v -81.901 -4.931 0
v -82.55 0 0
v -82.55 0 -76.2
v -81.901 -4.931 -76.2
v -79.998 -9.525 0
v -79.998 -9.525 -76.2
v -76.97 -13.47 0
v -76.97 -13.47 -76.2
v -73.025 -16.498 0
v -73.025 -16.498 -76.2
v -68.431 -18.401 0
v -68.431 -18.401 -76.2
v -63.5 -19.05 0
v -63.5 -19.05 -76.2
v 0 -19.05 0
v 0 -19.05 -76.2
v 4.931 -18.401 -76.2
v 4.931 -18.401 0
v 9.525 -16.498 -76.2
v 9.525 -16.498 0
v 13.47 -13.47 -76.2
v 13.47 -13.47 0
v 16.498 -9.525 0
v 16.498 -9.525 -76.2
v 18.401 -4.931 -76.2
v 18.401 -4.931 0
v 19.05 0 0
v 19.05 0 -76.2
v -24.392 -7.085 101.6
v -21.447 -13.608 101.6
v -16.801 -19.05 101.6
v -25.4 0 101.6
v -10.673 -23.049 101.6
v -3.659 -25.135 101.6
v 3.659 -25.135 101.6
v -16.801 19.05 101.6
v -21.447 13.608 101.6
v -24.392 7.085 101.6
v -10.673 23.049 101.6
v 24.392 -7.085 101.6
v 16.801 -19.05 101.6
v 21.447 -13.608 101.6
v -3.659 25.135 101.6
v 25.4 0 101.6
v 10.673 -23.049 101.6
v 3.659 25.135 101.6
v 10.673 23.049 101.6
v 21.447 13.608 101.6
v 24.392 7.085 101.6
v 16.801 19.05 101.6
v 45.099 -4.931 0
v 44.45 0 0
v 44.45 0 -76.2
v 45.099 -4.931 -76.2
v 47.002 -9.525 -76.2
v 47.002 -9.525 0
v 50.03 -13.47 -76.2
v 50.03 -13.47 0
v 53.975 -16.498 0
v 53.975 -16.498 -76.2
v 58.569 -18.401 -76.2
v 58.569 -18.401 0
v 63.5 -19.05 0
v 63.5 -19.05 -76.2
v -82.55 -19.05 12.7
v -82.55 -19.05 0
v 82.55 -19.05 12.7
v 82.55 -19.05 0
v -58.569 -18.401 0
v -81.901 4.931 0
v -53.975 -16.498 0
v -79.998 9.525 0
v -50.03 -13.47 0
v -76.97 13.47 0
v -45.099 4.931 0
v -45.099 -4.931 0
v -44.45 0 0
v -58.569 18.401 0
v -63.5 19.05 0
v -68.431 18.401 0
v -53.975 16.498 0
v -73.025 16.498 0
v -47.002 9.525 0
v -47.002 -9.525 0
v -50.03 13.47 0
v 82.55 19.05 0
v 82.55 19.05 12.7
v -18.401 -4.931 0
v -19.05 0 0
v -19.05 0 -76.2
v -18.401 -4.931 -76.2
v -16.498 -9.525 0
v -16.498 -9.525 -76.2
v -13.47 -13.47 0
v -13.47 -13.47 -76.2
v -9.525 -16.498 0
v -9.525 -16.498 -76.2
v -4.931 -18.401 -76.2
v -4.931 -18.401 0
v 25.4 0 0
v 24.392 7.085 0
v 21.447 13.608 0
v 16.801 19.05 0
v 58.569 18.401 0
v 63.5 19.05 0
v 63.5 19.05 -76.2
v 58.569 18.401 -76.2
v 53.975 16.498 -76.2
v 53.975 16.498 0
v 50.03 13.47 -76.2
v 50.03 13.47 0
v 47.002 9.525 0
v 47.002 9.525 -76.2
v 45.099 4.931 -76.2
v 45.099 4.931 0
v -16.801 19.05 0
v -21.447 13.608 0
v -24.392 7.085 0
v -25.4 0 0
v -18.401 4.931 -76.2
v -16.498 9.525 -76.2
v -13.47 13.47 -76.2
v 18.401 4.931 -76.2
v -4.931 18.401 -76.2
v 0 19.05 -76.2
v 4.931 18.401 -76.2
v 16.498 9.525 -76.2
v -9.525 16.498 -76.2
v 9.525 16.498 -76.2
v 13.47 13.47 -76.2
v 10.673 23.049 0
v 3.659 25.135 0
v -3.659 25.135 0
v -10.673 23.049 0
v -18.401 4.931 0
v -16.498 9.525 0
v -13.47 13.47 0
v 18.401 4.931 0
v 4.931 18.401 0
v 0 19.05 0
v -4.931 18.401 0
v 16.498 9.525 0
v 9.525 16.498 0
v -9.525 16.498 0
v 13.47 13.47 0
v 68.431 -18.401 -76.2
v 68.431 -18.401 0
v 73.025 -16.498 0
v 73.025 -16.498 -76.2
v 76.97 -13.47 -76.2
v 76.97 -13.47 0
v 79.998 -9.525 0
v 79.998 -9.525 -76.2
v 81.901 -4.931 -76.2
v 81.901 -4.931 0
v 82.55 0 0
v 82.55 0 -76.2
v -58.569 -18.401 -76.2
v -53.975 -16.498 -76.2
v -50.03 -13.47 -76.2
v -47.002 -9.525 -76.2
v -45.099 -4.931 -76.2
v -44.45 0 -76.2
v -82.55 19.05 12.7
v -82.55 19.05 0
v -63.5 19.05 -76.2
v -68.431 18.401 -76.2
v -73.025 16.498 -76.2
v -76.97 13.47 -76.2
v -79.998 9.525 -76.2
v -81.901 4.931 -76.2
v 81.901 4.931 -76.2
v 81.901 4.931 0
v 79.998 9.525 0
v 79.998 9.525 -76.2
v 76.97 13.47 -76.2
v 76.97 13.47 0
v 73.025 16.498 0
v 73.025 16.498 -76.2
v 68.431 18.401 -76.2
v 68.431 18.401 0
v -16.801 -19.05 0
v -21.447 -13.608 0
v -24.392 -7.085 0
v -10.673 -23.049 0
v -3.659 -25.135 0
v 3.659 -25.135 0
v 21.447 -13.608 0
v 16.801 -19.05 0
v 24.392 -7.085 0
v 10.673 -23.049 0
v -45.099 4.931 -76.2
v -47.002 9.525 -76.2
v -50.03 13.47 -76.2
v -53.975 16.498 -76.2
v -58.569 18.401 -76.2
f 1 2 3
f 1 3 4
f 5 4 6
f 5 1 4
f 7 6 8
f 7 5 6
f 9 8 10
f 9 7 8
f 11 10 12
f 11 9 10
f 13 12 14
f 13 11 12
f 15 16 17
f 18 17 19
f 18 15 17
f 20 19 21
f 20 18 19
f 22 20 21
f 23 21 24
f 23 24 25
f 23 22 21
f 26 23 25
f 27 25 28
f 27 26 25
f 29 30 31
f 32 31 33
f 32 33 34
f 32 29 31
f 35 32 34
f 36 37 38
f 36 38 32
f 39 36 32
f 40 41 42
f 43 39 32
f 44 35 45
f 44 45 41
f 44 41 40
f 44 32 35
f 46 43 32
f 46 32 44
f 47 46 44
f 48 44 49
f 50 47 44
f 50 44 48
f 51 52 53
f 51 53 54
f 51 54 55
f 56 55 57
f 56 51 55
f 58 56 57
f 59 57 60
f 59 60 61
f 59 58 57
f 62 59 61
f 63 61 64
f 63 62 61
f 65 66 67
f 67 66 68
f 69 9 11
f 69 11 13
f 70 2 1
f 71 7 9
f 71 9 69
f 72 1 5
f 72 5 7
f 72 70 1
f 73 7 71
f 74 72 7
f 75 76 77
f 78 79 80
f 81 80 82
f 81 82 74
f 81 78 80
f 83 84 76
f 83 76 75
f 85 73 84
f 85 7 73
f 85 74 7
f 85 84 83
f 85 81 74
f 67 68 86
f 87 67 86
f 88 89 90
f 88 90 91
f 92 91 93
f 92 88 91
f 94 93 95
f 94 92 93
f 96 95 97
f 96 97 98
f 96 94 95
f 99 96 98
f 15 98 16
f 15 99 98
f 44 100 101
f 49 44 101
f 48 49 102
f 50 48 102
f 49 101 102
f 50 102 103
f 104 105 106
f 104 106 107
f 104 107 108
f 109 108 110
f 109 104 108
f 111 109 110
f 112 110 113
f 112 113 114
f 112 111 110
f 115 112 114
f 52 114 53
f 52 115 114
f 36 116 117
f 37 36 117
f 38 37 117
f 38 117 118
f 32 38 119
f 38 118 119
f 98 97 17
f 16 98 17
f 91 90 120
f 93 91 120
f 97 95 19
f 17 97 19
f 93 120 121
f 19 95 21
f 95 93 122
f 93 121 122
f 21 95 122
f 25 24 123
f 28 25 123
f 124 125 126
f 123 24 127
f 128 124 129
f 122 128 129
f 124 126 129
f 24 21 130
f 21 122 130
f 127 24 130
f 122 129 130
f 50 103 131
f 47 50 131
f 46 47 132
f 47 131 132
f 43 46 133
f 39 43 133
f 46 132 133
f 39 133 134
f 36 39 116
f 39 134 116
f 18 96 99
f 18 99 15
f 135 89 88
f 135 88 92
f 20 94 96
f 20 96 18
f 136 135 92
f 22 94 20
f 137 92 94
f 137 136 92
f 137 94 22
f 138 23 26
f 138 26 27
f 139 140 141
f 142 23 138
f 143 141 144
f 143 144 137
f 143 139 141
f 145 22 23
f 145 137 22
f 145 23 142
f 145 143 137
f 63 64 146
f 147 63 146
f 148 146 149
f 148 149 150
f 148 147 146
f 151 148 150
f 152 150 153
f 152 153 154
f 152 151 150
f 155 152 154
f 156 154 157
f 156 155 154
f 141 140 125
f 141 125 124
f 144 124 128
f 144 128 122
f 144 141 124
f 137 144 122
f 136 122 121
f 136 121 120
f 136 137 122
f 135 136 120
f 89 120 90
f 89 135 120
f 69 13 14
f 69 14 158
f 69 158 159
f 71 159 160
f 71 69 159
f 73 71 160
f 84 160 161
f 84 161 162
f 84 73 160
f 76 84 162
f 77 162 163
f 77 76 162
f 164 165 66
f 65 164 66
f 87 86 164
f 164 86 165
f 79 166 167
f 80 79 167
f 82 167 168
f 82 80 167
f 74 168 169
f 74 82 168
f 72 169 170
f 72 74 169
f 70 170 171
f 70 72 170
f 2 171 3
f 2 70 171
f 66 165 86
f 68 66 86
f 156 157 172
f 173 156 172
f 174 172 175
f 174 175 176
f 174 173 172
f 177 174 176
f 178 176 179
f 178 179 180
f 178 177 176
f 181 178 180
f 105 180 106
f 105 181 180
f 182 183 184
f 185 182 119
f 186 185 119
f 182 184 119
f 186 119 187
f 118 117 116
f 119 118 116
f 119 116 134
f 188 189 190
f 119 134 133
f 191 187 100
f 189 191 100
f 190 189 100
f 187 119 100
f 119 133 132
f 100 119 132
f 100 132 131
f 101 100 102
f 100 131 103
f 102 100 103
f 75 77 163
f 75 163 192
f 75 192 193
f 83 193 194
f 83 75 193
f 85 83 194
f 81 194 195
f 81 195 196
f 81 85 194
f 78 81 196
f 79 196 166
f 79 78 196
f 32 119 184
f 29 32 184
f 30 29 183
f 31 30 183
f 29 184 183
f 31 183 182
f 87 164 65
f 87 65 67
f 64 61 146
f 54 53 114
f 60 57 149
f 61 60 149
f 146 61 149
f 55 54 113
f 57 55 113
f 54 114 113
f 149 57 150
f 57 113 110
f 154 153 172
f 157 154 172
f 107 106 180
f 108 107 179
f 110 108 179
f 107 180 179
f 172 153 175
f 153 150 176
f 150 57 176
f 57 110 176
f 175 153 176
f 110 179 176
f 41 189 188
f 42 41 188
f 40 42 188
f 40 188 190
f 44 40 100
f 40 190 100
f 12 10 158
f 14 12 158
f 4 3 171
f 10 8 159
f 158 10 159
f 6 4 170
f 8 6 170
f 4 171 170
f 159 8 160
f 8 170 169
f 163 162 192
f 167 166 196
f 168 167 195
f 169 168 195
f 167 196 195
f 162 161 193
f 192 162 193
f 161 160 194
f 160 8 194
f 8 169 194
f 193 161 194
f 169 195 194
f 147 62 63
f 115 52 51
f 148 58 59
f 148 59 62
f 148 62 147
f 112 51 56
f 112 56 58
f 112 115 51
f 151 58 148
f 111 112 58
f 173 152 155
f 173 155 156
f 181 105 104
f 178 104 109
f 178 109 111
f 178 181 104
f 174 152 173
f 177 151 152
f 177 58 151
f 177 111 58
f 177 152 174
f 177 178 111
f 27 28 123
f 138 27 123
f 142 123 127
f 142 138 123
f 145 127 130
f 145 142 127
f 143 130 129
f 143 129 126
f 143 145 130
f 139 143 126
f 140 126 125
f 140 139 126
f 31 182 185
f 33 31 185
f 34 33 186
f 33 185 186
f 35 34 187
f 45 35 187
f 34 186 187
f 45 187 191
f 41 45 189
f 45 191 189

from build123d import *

# Parameters (mm, degrees)
F1_DEPTH = 12.7
F2_DEPTH = 76.2
F3_DEPTH = 101.6


with BuildPart() as f1:
    # F0 (on Top) → F1 (new body)
    with BuildSketch(Plane.XY):
        with BuildLine():
            ThreePointArc((-82.55, 1.56e-07), (-76.9703841264, 13.4703842368), (-63.5, 19.05))
            Line((-63.5, 19.05), (-82.55, 19.05))
            Line((-82.55, 19.05), (-82.55, 1.56e-07))
        make_face()
        with BuildLine():
            ThreePointArc((-63.5, -19.05), (-76.9703842368, -13.4703841264), (-82.55, 1.56e-07))
            Line((-82.55, 1.56e-07), (-82.55, -19.05))
            Line((-82.55, -19.05), (-63.5, -19.05))
        make_face()
        with BuildLine():
            Line((82.55, 0), (82.55, 19.05))
            Line((82.55, 19.05), (63.5, 19.05))
            ThreePointArc((63.5, 19.05), (76.9703841816, 13.4703841816), (82.55, 0))
        make_face()
        with BuildLine():
            Line((82.55, -19.05), (82.55, 0))
            ThreePointArc((82.55, 0), (76.9703841816, -13.4703841816), (63.5, -19.05))
            Line((63.5, -19.05), (82.55, -19.05))
        make_face()
        with BuildLine():
            ThreePointArc((25.4, 0), (23.1505208253, 10.4505208253), (16.8005208253, 19.05))
            Line((16.8005208253, 19.05), (1.179e-07, 19.05))
            ThreePointArc((1.179e-07, 19.05), (13.4703842233, 13.4703841399), (19.05, 0))
            Line((19.05, 0), (25.4, 0))
        make_face()
        with BuildLine():
            ThreePointArc((19.05, 0), (13.4703842233, 13.4703841399), (1.179e-07, 19.05))
            ThreePointArc((1.179e-07, 19.05), (-13.4703841399, 13.4703842233), (-19.05, 0))
            ThreePointArc((-19.05, 0), (-13.4703841805, -13.4703841827), (3.1e-09, -19.05))
            ThreePointArc((3.1e-09, -19.05), (13.4703841827, -13.4703841805), (19.05, 0))
        make_face()
        with BuildLine():
            ThreePointArc((-25.4, 0), (-23.1505208253, 10.4505208253), (-16.8005208253, 19.05))
            Line((-16.8005208253, 19.05), (-63.5, 19.05))
            ThreePointArc((-63.5, 19.05), (-50.0296158184, 13.4703841816), (-44.45, 0))
            Line((-44.45, 0), (-25.4, 0))
        make_face()
        with BuildLine():
            ThreePointArc((-44.45, 0), (-50.0296158184, 13.4703841816), (-63.5, 19.05))
            ThreePointArc((-63.5, 19.05), (-76.9703841264, 13.4703842368), (-82.55, 1.56e-07))
            ThreePointArc((-82.55, 1.56e-07), (-76.9703842368, -13.4703841264), (-63.5, -19.05))
            ThreePointArc((-63.5, -19.05), (-50.0296158184, -13.4703841816), (-44.45, 0))
        make_face()
        with BuildLine():
            ThreePointArc((-16.8005208253, -19.05), (-23.1505208253, -10.4505208253), (-25.4, 0))
            Line((-25.4, 0), (-44.45, 0))
            ThreePointArc((-44.45, 0), (-50.0296158184, -13.4703841816), (-63.5, -19.05))
            Line((-63.5, -19.05), (-16.8005208253, -19.05))
        make_face()
        with BuildLine():
            ThreePointArc((-19.05, 0), (-13.4703841399, 13.4703842233), (1.179e-07, 19.05))
            Line((1.179e-07, 19.05), (-16.8005208253, 19.05))
            ThreePointArc((-16.8005208253, 19.05), (-23.1505208253, 10.4505208253), (-25.4, 0))
            Line((-25.4, 0), (-19.05, 0))
        make_face()
        with BuildLine():
            ThreePointArc((3.1e-09, -19.05), (-13.4703841805, -13.4703841827), (-19.05, 0))
            Line((-19.05, 0), (-25.4, 0))
            ThreePointArc((-25.4, 0), (-23.1505208253, -10.4505208253), (-16.8005208253, -19.05))
            Line((-16.8005208253, -19.05), (3.1e-09, -19.05))
        make_face()
        with BuildLine():
            ThreePointArc((16.8005208253, -19.05), (23.1505208253, -10.4505208253), (25.4, 0))
            Line((25.4, 0), (19.05, 0))
            ThreePointArc((19.05, 0), (13.4703841827, -13.4703841805), (3.1e-09, -19.05))
            Line((3.1e-09, -19.05), (16.8005208253, -19.05))
        make_face()
        with BuildLine():
            ThreePointArc((63.5, -19.05), (50.0296158184, -13.4703841816), (44.45, 0))
            Line((44.45, 0), (25.4, 0))
            ThreePointArc((25.4, 0), (23.1505208253, -10.4505208253), (16.8005208253, -19.05))
            Line((16.8005208253, -19.05), (63.5, -19.05))
        make_face()
        with BuildLine():
            ThreePointArc((44.45, 0), (50.0296158184, 13.4703841816), (63.5, 19.05))
            Line((63.5, 19.05), (16.8005208253, 19.05))
            ThreePointArc((16.8005208253, 19.05), (23.1505208253, 10.4505208253), (25.4, 0))
            Line((25.4, 0), (44.45, 0))
        make_face()
        with BuildLine():
            ThreePointArc((82.55, 0), (76.9703841816, 13.4703841816), (63.5, 19.05))
            ThreePointArc((63.5, 19.05), (50.0296158184, 13.4703841816), (44.45, 0))
            ThreePointArc((44.45, 0), (50.0296158184, -13.4703841816), (63.5, -19.05))
            ThreePointArc((63.5, -19.05), (76.9703841816, -13.4703841816), (82.55, 0))
        make_face()
    extrude(amount=F1_DEPTH)


with BuildPart() as f2:
    # F0 (on Top) → F2 (new body)
    with BuildSketch(Plane.XY):
        with BuildLine():
            ThreePointArc((82.55, 0), (76.9703841816, 13.4703841816), (63.5, 19.05))
            ThreePointArc((63.5, 19.05), (50.0296158184, 13.4703841816), (44.45, 0))
            ThreePointArc((44.45, 0), (50.0296158184, -13.4703841816), (63.5, -19.05))
            ThreePointArc((63.5, -19.05), (76.9703841816, -13.4703841816), (82.55, 0))
        make_face()
    extrude(amount=-F2_DEPTH)


with BuildPart() as f2b:
    # F0 (on Top) → F2, piece 2 (new body)
    with BuildSketch(Plane.XY):
        with BuildLine():
            ThreePointArc((19.05, 0), (13.4703842233, 13.4703841399), (1.179e-07, 19.05))
            ThreePointArc((1.179e-07, 19.05), (-13.4703841399, 13.4703842233), (-19.05, 0))
            ThreePointArc((-19.05, 0), (-13.4703841805, -13.4703841827), (3.1e-09, -19.05))
            ThreePointArc((3.1e-09, -19.05), (13.4703841827, -13.4703841805), (19.05, 0))
        make_face()
    extrude(amount=-F2_DEPTH)


with BuildPart() as f2c:
    # F0 (on Top) → F2, piece 3 (new body)
    with BuildSketch(Plane.XY):
        with BuildLine():
            ThreePointArc((-44.45, 0), (-50.0296158184, 13.4703841816), (-63.5, 19.05))
            ThreePointArc((-63.5, 19.05), (-76.9703841264, 13.4703842368), (-82.55, 1.56e-07))
            ThreePointArc((-82.55, 1.56e-07), (-76.9703842368, -13.4703841264), (-63.5, -19.05))
            ThreePointArc((-63.5, -19.05), (-50.0296158184, -13.4703841816), (-44.45, 0))
        make_face()
    extrude(amount=-F2_DEPTH)


with BuildPart() as f3:
    # F0 (on Top) → F3 (new body)
    with BuildSketch(Plane.XY):
        with BuildLine():
            Line((1.179e-07, 19.05), (16.8005208253, 19.05))
            ThreePointArc((16.8005208253, 19.05), (0, 25.4), (-16.8005208253, 19.05))
            Line((-16.8005208253, 19.05), (1.179e-07, 19.05))
        make_face()
        with BuildLine():
            ThreePointArc((-19.05, 0), (-13.4703841399, 13.4703842233), (1.179e-07, 19.05))
            Line((1.179e-07, 19.05), (-16.8005208253, 19.05))
            ThreePointArc((-16.8005208253, 19.05), (-23.1505208253, 10.4505208253), (-25.4, 0))
            Line((-25.4, 0), (-19.05, 0))
        make_face()
        with BuildLine():
            ThreePointArc((19.05, 0), (13.4703842233, 13.4703841399), (1.179e-07, 19.05))
            ThreePointArc((1.179e-07, 19.05), (-13.4703841399, 13.4703842233), (-19.05, 0))
            ThreePointArc((-19.05, 0), (-13.4703841805, -13.4703841827), (3.1e-09, -19.05))
            ThreePointArc((3.1e-09, -19.05), (13.4703841827, -13.4703841805), (19.05, 0))
        make_face()
        with BuildLine():
            ThreePointArc((3.1e-09, -19.05), (-13.4703841805, -13.4703841827), (-19.05, 0))
            Line((-19.05, 0), (-25.4, 0))
            ThreePointArc((-25.4, 0), (-23.1505208253, -10.4505208253), (-16.8005208253, -19.05))
            Line((-16.8005208253, -19.05), (3.1e-09, -19.05))
        make_face()
        with BuildLine():
            ThreePointArc((-16.8005208253, -19.05), (0, -25.4), (16.8005208253, -19.05))
            Line((16.8005208253, -19.05), (3.1e-09, -19.05))
            Line((3.1e-09, -19.05), (-16.8005208253, -19.05))
        make_face()
        with BuildLine():
            ThreePointArc((16.8005208253, -19.05), (23.1505208253, -10.4505208253), (25.4, 0))
            Line((25.4, 0), (19.05, 0))
            ThreePointArc((19.05, 0), (13.4703841827, -13.4703841805), (3.1e-09, -19.05))
            Line((3.1e-09, -19.05), (16.8005208253, -19.05))
        make_face()
        with BuildLine():
            ThreePointArc((25.4, 0), (23.1505208253, 10.4505208253), (16.8005208253, 19.05))
            Line((16.8005208253, 19.05), (1.179e-07, 19.05))
            ThreePointArc((1.179e-07, 19.05), (13.4703842233, 13.4703841399), (19.05, 0))
            Line((19.05, 0), (25.4, 0))
        make_face()
    extrude(amount=F3_DEPTH)


solid = Compound([f1.part, f2.part, f2b.part, f2c.part, f3.part])
